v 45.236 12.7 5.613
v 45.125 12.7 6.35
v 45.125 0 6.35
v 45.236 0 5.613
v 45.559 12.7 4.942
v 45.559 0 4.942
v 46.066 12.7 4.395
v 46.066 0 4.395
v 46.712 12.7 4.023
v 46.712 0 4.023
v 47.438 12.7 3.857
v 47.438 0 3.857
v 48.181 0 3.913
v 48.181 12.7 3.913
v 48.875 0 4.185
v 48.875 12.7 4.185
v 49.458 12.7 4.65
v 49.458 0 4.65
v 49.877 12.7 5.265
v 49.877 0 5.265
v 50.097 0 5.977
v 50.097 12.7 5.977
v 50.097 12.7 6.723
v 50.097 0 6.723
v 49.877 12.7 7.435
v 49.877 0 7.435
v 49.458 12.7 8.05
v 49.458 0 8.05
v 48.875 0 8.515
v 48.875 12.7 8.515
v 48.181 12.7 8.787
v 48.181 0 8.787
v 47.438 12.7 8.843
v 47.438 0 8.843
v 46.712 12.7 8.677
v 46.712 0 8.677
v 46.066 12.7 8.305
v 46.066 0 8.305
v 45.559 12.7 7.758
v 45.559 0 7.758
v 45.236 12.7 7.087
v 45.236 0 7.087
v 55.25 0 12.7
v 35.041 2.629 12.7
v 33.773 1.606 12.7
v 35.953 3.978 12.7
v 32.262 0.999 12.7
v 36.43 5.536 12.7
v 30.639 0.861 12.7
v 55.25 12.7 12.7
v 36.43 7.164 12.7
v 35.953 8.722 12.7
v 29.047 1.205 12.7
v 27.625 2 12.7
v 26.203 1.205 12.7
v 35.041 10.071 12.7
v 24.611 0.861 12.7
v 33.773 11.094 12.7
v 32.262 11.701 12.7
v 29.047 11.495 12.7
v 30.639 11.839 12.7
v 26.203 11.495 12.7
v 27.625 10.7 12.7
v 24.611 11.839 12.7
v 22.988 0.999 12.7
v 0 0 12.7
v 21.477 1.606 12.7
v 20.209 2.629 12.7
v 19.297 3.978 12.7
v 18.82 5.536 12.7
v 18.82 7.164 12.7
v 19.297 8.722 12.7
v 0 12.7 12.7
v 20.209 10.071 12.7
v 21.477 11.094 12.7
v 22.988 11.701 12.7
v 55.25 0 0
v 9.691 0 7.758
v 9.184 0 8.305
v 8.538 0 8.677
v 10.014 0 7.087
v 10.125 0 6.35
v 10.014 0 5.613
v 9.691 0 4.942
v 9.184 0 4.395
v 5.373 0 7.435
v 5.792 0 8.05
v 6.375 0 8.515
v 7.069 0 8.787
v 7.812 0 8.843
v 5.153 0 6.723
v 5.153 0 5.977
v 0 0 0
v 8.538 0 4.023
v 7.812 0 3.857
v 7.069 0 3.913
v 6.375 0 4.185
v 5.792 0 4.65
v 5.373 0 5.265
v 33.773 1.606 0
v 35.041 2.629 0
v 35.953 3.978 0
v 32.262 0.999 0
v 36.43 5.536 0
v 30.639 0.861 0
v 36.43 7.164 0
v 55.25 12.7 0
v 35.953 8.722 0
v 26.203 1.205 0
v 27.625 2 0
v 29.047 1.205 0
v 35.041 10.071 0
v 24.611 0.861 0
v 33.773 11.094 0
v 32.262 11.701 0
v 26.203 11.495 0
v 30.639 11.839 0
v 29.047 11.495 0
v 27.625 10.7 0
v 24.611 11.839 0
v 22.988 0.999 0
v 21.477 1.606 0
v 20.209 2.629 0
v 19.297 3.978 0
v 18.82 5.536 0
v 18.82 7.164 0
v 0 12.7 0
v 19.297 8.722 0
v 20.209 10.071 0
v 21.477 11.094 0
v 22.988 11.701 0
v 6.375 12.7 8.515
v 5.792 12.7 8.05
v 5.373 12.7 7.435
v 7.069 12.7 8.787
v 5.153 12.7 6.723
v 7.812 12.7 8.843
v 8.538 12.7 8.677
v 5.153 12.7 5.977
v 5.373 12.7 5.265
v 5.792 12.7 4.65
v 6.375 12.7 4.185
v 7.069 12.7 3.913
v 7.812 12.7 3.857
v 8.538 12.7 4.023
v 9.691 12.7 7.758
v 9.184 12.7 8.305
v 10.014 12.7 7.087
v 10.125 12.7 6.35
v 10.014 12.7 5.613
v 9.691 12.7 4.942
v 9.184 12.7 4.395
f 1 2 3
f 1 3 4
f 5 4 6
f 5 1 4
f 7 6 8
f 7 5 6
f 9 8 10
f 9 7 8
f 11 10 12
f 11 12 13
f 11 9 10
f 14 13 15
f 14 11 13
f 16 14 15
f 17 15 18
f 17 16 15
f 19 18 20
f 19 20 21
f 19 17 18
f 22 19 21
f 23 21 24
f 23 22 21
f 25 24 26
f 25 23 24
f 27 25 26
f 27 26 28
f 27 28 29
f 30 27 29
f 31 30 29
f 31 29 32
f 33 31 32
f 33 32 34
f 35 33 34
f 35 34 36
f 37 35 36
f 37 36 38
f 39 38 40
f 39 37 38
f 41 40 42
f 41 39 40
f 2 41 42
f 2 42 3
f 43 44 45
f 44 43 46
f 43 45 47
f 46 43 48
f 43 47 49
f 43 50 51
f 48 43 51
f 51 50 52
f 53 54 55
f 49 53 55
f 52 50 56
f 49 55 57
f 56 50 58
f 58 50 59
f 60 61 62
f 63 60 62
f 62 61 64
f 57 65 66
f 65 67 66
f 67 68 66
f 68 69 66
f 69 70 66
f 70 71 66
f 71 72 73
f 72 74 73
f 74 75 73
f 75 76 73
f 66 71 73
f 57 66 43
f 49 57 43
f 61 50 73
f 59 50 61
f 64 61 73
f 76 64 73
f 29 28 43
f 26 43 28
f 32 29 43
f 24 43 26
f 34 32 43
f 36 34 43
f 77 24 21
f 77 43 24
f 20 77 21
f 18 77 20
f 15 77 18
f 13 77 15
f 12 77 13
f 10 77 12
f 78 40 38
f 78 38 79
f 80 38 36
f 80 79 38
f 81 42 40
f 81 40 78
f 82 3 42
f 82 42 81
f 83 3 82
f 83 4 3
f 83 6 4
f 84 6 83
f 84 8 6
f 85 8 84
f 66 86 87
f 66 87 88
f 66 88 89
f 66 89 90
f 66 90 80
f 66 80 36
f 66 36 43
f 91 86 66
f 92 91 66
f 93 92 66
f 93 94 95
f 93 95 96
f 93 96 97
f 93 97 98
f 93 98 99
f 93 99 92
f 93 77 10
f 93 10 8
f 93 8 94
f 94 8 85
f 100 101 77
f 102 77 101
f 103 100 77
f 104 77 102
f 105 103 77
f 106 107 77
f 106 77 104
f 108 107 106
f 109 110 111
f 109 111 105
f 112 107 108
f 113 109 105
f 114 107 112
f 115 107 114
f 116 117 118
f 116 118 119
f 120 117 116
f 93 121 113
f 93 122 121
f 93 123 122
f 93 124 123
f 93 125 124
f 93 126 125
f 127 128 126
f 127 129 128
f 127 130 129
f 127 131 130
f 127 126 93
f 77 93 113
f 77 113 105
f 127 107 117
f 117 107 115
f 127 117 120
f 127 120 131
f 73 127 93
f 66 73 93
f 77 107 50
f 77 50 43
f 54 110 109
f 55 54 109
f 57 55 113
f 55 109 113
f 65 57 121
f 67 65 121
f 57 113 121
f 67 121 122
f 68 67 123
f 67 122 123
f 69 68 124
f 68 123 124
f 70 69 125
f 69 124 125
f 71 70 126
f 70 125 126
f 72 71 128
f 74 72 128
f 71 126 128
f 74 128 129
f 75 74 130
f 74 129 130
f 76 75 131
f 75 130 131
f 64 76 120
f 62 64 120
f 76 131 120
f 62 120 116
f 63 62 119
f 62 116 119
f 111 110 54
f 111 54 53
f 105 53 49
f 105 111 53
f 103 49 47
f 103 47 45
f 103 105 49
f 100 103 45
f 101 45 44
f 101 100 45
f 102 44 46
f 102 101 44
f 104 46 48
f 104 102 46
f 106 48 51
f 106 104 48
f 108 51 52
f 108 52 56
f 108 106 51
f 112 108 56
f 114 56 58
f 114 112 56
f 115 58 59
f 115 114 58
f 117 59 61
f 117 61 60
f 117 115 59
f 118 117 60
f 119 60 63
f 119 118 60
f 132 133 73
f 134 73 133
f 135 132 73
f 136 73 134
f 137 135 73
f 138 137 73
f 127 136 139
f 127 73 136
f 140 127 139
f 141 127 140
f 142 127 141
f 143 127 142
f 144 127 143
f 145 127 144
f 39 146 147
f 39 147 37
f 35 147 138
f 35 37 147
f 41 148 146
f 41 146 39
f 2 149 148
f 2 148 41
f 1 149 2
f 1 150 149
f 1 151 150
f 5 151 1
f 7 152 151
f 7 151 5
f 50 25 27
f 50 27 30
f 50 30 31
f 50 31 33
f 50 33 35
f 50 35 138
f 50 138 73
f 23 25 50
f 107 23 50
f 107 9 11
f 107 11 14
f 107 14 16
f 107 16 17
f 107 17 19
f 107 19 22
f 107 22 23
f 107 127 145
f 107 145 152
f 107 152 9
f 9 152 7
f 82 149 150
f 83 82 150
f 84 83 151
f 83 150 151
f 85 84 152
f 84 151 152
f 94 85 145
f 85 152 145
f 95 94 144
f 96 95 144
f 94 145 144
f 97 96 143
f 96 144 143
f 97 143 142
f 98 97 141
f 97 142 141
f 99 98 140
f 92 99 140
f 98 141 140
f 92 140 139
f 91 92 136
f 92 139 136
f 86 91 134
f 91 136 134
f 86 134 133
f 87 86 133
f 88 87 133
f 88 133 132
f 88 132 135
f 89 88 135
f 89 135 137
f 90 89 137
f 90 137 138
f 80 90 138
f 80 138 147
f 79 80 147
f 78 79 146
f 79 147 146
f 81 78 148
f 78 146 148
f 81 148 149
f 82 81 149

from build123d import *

# Parameters (mm, degrees)
BOSS_EXTRU_2_DEPTH      = 12.7
ESQUISSE3_R             = 2.5
ENL_V_MAT_EXTRU_1_DEPTH = 12.7


with BuildPart() as part:
    # Esquisse1 → Boss.-Extru.2 (new body)
    with BuildSketch(Plane.XY):
        with BuildLine():
            Line((0, 0), (27.625, 0))
            Line((27.625, 0), (27.625, 2))
            ThreePointArc((27.625, 2), (18.759364844, 6.35), (27.625, 10.7))
            Line((27.625, 10.7), (27.625, 12.7))
            Line((27.625, 12.7), (0, 12.7))
            Line((0, 12.7), (0, 0))
        make_face()
    boss_extru_2 = extrude(amount=BOSS_EXTRU_2_DEPTH)

    # Esquisse3 → Enlèv. mat.-Extru.1 (cut)
    with BuildSketch(Plane(origin=(0, 12.7, 0), x_dir=(1, 0, 0), z_dir=(0, 1, 0))):
        with Locations((7.625, -6.35)):
            Circle(ESQUISSE3_R)
    enl_v_mat_extru_1 = extrude(amount=-ENL_V_MAT_EXTRU_1_DEPTH, mode=Mode.SUBTRACT)

    # Symétrie1: Boss.-Extru.2, Enlèv. mat.-Extru.1 across plane
    add(boss_extru_2.mirror(Plane(origin=(27.625, 12.7, 12.7), x_dir=(0, 0, 1), z_dir=(-1, 0, 0))))
    add(enl_v_mat_extru_1.mirror(Plane(origin=(27.625, 12.7, 12.7), x_dir=(0, 0, 1), z_dir=(-1, 0, 0))), mode=Mode.SUBTRACT)


solid = part.part
